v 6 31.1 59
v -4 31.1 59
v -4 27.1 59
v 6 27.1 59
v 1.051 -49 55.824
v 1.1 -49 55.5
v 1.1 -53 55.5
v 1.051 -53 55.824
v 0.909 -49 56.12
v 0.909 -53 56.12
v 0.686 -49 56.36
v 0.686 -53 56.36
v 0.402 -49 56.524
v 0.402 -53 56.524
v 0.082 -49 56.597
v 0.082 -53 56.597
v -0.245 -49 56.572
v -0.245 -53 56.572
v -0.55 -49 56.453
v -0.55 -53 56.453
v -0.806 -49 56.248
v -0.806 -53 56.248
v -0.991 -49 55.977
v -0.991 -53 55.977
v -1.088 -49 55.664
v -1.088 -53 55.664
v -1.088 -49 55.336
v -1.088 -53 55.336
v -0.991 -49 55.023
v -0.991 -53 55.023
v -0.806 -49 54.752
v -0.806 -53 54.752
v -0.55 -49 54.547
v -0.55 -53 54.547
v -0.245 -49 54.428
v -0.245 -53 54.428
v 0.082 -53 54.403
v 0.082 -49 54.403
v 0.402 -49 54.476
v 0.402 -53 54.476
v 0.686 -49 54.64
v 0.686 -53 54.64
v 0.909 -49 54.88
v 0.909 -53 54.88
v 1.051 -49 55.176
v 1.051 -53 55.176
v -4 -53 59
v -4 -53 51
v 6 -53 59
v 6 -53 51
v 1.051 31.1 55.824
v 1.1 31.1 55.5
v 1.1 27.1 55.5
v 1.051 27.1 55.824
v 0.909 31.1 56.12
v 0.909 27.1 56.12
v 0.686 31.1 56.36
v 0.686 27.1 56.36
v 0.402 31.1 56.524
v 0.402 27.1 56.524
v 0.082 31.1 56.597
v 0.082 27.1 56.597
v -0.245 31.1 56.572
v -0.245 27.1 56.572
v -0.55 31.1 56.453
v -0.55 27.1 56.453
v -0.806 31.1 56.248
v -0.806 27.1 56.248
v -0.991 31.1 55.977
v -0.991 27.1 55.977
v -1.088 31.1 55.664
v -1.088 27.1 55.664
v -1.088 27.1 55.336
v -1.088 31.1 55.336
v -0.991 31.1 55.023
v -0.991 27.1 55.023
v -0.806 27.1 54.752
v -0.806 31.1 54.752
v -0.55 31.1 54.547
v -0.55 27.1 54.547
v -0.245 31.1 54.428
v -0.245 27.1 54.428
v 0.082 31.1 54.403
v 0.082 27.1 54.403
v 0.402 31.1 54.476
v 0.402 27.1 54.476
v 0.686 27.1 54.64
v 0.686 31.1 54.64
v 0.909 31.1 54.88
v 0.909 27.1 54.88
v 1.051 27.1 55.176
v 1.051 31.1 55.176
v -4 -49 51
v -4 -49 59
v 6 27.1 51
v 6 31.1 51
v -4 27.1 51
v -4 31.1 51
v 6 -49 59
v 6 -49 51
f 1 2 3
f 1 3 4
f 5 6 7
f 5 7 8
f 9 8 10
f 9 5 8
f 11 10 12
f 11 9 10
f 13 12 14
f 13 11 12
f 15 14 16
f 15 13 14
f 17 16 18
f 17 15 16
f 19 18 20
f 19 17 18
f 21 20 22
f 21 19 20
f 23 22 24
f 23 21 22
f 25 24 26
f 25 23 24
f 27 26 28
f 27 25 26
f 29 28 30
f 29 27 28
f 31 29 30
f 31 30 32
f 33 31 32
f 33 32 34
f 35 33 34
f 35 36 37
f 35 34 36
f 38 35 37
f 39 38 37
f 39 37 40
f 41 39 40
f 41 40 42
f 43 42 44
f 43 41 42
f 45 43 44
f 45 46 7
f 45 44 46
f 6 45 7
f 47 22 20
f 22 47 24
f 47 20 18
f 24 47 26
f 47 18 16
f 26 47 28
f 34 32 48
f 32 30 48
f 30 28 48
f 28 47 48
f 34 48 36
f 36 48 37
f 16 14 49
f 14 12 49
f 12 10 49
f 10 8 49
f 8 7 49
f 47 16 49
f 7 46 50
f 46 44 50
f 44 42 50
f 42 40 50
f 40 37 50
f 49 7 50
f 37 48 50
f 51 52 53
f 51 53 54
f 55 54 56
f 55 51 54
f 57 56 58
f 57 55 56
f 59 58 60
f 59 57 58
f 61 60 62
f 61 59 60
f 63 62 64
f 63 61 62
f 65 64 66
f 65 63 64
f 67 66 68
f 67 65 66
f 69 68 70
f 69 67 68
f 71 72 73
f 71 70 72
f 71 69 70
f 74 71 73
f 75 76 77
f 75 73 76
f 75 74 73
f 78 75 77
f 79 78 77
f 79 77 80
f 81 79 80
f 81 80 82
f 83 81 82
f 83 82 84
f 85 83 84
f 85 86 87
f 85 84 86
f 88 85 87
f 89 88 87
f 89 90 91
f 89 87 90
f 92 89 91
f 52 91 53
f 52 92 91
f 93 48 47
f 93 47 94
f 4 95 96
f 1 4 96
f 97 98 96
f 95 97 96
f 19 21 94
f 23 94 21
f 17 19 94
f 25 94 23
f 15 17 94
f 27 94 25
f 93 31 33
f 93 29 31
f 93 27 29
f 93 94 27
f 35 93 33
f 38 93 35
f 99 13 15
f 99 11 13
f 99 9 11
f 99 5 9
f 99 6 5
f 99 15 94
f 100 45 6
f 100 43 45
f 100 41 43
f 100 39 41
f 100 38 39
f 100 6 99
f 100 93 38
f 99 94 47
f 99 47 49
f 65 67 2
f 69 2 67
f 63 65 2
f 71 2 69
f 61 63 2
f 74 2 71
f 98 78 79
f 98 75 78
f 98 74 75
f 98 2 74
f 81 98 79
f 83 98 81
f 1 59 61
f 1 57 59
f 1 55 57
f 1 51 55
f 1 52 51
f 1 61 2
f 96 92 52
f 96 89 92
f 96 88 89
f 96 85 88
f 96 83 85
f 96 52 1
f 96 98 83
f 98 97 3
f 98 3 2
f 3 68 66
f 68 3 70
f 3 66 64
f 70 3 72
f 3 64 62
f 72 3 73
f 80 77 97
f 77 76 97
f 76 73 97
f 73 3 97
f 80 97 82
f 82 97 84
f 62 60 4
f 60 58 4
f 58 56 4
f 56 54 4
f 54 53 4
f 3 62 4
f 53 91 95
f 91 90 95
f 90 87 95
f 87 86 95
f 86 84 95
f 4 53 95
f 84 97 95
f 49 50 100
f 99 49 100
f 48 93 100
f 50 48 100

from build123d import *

# Parameters (mm, degrees)
CYLINDER_R     = 1.1
CYLINDER_DEPTH = 120
BOX004_W       = 10
BOX004_H       = 4
BOX004_DEPTH   = 8
ARRAY_Y_COUNT  = 2
ARRAY_Y_PITCH  = 80.1


with BuildPart() as cylinder:
    # Cylinder → Cylinder (new body)
    with BuildSketch(Plane(origin=(0, 50, 55.5), x_dir=(1, 0, 0), z_dir=(0, -1, 0))):
        Circle(CYLINDER_R)
    extrude(amount=CYLINDER_DEPTH)


with BuildPart() as cut001002:
    # Box004 → Box004 (new body)
    with BuildSketch(Plane(origin=(-4, -53, 51), x_dir=(1, 0, 0), z_dir=(0, 0, 1))):
        with Locations((5, 2)):
            Rectangle(BOX004_W, BOX004_H)
    extrude(amount=BOX004_DEPTH)

    # Array Y: Cut001002 ×2


with BuildPart() as cut001002_1:
    add(cut001002.part)
    with Locations(*[(0, i * ARRAY_Y_PITCH, 0) for i in range(1, ARRAY_Y_COUNT)]):
        add(cut001002.part)

    # Cut001002: cut Cylinder
    add(cylinder.part, mode=Mode.SUBTRACT)


solid = cut001002_1.part
